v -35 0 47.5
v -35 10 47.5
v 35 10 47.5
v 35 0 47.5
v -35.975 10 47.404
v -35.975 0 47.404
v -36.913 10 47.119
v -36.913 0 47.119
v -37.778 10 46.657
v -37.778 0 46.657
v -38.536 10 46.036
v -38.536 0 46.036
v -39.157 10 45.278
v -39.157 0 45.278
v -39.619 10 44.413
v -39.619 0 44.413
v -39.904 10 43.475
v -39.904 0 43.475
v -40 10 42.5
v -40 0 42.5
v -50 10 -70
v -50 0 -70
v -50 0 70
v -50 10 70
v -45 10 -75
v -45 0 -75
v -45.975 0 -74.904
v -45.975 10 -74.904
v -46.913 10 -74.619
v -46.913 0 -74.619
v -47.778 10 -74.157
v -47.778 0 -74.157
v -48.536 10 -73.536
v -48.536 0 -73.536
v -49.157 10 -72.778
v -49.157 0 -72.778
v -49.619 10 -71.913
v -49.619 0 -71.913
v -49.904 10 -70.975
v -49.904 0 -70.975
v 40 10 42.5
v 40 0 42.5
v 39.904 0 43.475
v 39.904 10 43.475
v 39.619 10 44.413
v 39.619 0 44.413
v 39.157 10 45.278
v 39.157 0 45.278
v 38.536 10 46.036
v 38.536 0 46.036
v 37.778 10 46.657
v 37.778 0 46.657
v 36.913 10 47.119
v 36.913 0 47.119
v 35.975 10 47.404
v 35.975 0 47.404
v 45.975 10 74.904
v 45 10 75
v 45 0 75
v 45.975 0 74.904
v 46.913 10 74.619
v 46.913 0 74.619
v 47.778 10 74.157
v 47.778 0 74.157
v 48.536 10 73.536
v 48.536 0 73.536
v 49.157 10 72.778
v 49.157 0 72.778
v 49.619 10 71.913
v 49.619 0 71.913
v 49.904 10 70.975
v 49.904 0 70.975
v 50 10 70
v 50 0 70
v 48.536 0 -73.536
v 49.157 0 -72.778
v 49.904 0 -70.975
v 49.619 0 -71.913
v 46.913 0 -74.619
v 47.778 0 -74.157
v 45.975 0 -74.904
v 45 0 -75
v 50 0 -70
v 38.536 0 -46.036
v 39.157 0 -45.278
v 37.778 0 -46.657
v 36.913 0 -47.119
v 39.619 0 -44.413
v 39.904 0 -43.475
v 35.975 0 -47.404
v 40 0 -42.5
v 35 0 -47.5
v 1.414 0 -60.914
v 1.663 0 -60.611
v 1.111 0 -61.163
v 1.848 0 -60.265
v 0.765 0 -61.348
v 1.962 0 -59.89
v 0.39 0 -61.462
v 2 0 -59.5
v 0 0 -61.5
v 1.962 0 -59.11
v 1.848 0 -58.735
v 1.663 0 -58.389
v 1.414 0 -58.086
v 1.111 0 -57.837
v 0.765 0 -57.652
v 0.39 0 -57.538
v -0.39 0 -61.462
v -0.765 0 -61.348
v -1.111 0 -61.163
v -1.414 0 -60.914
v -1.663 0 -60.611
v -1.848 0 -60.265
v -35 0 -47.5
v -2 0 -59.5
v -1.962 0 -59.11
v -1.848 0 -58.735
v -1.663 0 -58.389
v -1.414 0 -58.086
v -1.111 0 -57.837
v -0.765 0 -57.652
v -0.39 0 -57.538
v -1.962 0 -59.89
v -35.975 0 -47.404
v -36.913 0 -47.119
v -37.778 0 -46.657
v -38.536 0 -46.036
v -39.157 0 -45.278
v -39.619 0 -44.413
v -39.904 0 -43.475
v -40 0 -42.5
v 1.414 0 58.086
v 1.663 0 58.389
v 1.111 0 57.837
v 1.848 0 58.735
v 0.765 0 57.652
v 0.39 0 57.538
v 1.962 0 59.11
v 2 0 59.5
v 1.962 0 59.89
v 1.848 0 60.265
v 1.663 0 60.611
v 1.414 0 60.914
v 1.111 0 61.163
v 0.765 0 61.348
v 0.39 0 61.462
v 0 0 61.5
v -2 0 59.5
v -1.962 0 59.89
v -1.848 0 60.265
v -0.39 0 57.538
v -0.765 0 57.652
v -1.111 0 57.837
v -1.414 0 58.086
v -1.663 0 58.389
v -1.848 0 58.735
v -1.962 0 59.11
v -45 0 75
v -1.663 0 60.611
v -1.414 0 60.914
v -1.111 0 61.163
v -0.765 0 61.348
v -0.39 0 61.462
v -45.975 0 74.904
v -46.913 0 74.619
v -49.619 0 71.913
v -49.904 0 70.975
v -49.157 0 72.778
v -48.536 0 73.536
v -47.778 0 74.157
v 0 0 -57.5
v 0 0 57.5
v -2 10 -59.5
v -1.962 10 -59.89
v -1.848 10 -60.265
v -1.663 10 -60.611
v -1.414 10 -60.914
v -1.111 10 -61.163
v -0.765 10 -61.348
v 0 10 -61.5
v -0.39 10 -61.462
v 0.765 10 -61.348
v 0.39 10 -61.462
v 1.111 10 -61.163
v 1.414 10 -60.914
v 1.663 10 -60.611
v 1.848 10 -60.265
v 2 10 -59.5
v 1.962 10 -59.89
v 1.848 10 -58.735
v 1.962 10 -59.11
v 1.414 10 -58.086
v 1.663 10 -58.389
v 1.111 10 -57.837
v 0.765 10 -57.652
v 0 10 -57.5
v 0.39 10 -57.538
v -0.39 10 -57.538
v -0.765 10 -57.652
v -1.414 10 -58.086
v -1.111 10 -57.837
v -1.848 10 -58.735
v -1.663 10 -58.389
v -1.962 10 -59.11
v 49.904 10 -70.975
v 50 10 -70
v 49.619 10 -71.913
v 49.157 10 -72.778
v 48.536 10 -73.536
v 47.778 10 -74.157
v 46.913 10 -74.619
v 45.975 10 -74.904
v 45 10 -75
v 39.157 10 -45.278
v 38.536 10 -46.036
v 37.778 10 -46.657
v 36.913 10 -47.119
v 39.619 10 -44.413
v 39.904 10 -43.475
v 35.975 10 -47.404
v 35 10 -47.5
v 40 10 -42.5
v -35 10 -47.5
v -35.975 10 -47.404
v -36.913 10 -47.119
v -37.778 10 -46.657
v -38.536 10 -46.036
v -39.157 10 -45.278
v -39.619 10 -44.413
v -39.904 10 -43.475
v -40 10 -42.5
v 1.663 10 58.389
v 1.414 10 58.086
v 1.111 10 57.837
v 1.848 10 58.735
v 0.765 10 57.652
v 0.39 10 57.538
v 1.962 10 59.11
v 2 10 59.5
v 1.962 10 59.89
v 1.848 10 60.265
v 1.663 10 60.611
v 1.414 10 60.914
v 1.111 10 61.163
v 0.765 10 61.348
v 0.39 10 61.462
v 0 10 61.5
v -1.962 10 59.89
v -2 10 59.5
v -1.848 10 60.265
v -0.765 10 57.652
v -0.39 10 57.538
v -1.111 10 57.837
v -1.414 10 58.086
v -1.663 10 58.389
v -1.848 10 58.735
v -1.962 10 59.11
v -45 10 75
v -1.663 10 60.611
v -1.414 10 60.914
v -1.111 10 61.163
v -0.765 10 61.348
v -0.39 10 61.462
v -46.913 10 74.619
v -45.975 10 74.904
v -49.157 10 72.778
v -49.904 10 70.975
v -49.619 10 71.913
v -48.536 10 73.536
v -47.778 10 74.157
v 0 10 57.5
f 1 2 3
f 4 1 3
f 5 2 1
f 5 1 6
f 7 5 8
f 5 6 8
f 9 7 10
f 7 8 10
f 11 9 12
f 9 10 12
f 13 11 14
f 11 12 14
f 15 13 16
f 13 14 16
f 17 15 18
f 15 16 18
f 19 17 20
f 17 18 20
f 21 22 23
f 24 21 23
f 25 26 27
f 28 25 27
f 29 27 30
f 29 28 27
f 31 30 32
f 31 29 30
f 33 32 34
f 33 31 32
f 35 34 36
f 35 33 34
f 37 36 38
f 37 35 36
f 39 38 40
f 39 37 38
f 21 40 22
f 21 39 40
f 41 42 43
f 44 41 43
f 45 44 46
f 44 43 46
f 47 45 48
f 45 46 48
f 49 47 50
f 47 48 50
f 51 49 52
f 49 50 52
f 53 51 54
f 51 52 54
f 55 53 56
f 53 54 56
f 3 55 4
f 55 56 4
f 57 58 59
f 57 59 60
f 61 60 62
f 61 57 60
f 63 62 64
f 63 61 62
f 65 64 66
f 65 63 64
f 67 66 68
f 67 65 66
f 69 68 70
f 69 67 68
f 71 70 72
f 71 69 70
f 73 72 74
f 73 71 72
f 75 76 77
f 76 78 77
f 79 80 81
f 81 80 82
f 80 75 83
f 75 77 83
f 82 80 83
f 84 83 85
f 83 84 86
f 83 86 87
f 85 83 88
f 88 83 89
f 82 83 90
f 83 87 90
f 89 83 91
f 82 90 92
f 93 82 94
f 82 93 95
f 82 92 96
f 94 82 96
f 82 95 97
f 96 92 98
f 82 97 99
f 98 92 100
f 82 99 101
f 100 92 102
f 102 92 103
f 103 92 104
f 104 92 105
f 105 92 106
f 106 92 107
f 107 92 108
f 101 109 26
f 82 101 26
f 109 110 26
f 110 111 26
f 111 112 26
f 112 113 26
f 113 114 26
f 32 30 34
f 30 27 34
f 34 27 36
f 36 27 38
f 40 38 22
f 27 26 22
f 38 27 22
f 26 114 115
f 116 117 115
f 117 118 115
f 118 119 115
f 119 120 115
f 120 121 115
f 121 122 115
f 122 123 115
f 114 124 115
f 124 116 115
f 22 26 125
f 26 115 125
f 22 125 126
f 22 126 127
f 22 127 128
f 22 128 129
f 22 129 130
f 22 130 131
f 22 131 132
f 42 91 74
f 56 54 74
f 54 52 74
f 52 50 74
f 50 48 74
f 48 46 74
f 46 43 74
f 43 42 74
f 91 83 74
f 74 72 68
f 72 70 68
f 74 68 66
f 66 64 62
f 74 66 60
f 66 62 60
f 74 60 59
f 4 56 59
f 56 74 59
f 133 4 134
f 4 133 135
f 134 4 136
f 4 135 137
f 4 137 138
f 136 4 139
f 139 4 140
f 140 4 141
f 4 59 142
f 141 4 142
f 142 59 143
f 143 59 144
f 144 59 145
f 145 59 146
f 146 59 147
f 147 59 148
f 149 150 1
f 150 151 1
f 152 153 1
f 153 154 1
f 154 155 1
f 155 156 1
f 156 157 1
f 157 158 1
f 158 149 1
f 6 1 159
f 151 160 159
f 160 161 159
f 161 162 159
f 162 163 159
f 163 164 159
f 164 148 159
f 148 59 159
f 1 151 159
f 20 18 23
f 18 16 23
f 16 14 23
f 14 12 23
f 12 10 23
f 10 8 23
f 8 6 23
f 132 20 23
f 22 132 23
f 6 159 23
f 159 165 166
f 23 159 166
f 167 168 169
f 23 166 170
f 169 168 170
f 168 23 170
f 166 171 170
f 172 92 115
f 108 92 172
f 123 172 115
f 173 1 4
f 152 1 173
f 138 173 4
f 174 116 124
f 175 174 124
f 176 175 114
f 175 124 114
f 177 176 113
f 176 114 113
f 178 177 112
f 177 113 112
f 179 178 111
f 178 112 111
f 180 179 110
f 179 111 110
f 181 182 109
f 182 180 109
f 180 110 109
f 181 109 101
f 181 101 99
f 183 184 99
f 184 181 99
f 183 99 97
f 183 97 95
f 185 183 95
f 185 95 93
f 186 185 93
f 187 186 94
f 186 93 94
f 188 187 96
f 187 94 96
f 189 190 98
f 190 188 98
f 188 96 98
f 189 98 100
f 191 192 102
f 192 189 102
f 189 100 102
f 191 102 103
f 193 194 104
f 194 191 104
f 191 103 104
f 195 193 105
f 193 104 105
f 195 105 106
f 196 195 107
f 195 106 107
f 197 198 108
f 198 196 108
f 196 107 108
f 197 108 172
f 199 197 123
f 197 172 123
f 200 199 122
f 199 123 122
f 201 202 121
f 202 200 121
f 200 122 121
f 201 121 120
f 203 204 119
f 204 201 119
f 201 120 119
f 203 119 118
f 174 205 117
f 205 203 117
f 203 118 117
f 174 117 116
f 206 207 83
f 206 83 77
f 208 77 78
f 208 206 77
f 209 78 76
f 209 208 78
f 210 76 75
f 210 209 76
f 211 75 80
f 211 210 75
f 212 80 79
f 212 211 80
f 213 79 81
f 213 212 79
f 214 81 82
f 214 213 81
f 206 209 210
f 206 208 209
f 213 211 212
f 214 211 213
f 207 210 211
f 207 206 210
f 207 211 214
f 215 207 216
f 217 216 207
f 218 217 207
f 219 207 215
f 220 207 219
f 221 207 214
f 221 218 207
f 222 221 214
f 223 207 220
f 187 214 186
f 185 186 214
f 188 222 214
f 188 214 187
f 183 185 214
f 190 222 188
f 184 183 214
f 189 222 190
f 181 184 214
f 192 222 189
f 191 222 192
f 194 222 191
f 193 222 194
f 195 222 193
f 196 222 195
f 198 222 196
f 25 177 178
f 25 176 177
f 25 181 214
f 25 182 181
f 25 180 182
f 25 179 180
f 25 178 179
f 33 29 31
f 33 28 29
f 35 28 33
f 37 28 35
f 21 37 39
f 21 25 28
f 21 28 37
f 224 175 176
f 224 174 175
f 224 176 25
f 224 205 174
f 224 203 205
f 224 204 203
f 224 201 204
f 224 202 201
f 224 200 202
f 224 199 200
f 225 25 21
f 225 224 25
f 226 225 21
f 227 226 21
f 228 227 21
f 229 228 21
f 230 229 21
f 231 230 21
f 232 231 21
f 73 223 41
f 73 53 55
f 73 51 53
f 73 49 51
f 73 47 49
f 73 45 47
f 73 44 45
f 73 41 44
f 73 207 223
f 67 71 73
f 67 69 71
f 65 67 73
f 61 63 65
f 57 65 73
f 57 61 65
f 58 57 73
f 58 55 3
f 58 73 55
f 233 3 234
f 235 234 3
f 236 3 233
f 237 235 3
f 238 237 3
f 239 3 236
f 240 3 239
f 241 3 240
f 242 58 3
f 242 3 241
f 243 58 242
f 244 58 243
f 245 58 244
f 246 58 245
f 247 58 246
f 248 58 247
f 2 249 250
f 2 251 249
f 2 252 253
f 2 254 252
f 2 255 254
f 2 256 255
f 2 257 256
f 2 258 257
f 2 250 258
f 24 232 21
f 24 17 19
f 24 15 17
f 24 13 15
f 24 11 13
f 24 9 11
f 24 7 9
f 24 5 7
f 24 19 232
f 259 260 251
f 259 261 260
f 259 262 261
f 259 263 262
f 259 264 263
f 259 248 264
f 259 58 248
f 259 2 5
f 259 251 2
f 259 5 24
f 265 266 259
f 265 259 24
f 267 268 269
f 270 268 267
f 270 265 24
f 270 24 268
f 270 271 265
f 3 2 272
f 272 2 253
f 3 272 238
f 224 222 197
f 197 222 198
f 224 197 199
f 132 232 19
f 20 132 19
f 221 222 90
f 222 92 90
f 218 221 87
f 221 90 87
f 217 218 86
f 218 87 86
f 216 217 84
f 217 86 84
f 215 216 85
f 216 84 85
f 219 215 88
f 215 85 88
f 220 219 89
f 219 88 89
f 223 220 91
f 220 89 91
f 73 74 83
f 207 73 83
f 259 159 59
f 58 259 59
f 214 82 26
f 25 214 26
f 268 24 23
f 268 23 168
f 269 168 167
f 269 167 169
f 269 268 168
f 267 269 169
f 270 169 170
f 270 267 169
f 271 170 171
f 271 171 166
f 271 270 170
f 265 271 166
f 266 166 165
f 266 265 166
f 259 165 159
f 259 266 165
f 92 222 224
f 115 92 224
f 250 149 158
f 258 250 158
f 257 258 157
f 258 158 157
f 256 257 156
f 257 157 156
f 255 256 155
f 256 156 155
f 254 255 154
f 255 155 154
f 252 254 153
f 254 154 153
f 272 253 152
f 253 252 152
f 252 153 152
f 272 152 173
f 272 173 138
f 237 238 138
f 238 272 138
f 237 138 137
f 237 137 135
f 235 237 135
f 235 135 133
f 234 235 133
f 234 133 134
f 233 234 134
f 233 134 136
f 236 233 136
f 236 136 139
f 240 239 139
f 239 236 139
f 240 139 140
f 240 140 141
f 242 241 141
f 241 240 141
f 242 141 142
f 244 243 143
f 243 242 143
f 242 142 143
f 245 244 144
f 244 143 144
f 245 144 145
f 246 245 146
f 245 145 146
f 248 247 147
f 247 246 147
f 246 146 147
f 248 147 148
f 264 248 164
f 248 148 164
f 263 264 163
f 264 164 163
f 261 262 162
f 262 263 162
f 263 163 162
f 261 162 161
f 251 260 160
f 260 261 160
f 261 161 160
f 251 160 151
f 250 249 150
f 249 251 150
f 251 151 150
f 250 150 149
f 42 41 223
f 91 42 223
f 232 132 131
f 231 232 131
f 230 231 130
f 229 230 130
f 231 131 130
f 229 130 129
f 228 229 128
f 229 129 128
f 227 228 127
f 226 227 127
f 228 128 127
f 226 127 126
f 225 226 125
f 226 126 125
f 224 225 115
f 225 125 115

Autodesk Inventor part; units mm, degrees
ref_plane "YZ Plane" through (0, 0, 0) normal (1, 0, 0) x (0, 1, 0)
ref_plane "XZ Plane" through (0, 0, 0) normal (0, 1, 0) x (-1, 0, 0)
ref_plane "XY Plane" through (0, 0, 0) normal (0, 0, 1) x (1, 0, 0)
sketch "Sketch1" plane through (0, 0, 0) normal (0, 1, 0) x (-1, 0, 0)
  line L0 (50, 75) -> (-50, 75)
  line L1 (-50, 75) -> (-50, -75)
  line L2 (-50, -75) -> (50, -75)
  line L3 (50, -75) -> (50, 75)
  line L4 (50, 75) -> (-50, -75) construction
  line L5 (-50, 75) -> (50, -75) construction
  circle A0 centre (0, 59.5) radius 2
  line L6 (0, 0) -> (50, 0) construction
  circle A1 centre (0, -59.5) radius 2
  dimension "d0" = 150
  dimension "d1" = 100
  dimension "d2" = 59.5
  dimension "d3" = 4
extrude "Extrusion1" add sketch "Sketch1" along normal blind 10
fillet "Fillet1" radius 5 4 edges at (50, 5, 75) (50, 5, -75) (-50, 5, 75) (-50, 5, -75)
sketch "Sketch2" plane through (0, 10, 0) normal (0, 1, 0) x (1, 0, 0)
  line L0 (-40, -47.5) -> (40, -47.5)
  line L1 (40, -47.5) -> (40, 47.5)
  line L2 (40, 47.5) -> (-40, 47.5)
  line L3 (-40, 47.5) -> (-40, -47.5)
  line L4 (-40, -47.5) -> (40, 47.5) construction
  line L5 (40, -47.5) -> (-40, 47.5) construction
  point P0 (0, 0)
  dimension "d7" = 95
  dimension "d8" = 80
extrude "Extrusion2" cut sketch "Sketch2" against normal blind 10
fillet "Fillet2" radius 5 4 edges at (-40, 5, -47.5) (40, 5, -47.5) (40, 5, 47.5) (-40, 5, 47.5)
properties part number "Base(4mm holes)"
